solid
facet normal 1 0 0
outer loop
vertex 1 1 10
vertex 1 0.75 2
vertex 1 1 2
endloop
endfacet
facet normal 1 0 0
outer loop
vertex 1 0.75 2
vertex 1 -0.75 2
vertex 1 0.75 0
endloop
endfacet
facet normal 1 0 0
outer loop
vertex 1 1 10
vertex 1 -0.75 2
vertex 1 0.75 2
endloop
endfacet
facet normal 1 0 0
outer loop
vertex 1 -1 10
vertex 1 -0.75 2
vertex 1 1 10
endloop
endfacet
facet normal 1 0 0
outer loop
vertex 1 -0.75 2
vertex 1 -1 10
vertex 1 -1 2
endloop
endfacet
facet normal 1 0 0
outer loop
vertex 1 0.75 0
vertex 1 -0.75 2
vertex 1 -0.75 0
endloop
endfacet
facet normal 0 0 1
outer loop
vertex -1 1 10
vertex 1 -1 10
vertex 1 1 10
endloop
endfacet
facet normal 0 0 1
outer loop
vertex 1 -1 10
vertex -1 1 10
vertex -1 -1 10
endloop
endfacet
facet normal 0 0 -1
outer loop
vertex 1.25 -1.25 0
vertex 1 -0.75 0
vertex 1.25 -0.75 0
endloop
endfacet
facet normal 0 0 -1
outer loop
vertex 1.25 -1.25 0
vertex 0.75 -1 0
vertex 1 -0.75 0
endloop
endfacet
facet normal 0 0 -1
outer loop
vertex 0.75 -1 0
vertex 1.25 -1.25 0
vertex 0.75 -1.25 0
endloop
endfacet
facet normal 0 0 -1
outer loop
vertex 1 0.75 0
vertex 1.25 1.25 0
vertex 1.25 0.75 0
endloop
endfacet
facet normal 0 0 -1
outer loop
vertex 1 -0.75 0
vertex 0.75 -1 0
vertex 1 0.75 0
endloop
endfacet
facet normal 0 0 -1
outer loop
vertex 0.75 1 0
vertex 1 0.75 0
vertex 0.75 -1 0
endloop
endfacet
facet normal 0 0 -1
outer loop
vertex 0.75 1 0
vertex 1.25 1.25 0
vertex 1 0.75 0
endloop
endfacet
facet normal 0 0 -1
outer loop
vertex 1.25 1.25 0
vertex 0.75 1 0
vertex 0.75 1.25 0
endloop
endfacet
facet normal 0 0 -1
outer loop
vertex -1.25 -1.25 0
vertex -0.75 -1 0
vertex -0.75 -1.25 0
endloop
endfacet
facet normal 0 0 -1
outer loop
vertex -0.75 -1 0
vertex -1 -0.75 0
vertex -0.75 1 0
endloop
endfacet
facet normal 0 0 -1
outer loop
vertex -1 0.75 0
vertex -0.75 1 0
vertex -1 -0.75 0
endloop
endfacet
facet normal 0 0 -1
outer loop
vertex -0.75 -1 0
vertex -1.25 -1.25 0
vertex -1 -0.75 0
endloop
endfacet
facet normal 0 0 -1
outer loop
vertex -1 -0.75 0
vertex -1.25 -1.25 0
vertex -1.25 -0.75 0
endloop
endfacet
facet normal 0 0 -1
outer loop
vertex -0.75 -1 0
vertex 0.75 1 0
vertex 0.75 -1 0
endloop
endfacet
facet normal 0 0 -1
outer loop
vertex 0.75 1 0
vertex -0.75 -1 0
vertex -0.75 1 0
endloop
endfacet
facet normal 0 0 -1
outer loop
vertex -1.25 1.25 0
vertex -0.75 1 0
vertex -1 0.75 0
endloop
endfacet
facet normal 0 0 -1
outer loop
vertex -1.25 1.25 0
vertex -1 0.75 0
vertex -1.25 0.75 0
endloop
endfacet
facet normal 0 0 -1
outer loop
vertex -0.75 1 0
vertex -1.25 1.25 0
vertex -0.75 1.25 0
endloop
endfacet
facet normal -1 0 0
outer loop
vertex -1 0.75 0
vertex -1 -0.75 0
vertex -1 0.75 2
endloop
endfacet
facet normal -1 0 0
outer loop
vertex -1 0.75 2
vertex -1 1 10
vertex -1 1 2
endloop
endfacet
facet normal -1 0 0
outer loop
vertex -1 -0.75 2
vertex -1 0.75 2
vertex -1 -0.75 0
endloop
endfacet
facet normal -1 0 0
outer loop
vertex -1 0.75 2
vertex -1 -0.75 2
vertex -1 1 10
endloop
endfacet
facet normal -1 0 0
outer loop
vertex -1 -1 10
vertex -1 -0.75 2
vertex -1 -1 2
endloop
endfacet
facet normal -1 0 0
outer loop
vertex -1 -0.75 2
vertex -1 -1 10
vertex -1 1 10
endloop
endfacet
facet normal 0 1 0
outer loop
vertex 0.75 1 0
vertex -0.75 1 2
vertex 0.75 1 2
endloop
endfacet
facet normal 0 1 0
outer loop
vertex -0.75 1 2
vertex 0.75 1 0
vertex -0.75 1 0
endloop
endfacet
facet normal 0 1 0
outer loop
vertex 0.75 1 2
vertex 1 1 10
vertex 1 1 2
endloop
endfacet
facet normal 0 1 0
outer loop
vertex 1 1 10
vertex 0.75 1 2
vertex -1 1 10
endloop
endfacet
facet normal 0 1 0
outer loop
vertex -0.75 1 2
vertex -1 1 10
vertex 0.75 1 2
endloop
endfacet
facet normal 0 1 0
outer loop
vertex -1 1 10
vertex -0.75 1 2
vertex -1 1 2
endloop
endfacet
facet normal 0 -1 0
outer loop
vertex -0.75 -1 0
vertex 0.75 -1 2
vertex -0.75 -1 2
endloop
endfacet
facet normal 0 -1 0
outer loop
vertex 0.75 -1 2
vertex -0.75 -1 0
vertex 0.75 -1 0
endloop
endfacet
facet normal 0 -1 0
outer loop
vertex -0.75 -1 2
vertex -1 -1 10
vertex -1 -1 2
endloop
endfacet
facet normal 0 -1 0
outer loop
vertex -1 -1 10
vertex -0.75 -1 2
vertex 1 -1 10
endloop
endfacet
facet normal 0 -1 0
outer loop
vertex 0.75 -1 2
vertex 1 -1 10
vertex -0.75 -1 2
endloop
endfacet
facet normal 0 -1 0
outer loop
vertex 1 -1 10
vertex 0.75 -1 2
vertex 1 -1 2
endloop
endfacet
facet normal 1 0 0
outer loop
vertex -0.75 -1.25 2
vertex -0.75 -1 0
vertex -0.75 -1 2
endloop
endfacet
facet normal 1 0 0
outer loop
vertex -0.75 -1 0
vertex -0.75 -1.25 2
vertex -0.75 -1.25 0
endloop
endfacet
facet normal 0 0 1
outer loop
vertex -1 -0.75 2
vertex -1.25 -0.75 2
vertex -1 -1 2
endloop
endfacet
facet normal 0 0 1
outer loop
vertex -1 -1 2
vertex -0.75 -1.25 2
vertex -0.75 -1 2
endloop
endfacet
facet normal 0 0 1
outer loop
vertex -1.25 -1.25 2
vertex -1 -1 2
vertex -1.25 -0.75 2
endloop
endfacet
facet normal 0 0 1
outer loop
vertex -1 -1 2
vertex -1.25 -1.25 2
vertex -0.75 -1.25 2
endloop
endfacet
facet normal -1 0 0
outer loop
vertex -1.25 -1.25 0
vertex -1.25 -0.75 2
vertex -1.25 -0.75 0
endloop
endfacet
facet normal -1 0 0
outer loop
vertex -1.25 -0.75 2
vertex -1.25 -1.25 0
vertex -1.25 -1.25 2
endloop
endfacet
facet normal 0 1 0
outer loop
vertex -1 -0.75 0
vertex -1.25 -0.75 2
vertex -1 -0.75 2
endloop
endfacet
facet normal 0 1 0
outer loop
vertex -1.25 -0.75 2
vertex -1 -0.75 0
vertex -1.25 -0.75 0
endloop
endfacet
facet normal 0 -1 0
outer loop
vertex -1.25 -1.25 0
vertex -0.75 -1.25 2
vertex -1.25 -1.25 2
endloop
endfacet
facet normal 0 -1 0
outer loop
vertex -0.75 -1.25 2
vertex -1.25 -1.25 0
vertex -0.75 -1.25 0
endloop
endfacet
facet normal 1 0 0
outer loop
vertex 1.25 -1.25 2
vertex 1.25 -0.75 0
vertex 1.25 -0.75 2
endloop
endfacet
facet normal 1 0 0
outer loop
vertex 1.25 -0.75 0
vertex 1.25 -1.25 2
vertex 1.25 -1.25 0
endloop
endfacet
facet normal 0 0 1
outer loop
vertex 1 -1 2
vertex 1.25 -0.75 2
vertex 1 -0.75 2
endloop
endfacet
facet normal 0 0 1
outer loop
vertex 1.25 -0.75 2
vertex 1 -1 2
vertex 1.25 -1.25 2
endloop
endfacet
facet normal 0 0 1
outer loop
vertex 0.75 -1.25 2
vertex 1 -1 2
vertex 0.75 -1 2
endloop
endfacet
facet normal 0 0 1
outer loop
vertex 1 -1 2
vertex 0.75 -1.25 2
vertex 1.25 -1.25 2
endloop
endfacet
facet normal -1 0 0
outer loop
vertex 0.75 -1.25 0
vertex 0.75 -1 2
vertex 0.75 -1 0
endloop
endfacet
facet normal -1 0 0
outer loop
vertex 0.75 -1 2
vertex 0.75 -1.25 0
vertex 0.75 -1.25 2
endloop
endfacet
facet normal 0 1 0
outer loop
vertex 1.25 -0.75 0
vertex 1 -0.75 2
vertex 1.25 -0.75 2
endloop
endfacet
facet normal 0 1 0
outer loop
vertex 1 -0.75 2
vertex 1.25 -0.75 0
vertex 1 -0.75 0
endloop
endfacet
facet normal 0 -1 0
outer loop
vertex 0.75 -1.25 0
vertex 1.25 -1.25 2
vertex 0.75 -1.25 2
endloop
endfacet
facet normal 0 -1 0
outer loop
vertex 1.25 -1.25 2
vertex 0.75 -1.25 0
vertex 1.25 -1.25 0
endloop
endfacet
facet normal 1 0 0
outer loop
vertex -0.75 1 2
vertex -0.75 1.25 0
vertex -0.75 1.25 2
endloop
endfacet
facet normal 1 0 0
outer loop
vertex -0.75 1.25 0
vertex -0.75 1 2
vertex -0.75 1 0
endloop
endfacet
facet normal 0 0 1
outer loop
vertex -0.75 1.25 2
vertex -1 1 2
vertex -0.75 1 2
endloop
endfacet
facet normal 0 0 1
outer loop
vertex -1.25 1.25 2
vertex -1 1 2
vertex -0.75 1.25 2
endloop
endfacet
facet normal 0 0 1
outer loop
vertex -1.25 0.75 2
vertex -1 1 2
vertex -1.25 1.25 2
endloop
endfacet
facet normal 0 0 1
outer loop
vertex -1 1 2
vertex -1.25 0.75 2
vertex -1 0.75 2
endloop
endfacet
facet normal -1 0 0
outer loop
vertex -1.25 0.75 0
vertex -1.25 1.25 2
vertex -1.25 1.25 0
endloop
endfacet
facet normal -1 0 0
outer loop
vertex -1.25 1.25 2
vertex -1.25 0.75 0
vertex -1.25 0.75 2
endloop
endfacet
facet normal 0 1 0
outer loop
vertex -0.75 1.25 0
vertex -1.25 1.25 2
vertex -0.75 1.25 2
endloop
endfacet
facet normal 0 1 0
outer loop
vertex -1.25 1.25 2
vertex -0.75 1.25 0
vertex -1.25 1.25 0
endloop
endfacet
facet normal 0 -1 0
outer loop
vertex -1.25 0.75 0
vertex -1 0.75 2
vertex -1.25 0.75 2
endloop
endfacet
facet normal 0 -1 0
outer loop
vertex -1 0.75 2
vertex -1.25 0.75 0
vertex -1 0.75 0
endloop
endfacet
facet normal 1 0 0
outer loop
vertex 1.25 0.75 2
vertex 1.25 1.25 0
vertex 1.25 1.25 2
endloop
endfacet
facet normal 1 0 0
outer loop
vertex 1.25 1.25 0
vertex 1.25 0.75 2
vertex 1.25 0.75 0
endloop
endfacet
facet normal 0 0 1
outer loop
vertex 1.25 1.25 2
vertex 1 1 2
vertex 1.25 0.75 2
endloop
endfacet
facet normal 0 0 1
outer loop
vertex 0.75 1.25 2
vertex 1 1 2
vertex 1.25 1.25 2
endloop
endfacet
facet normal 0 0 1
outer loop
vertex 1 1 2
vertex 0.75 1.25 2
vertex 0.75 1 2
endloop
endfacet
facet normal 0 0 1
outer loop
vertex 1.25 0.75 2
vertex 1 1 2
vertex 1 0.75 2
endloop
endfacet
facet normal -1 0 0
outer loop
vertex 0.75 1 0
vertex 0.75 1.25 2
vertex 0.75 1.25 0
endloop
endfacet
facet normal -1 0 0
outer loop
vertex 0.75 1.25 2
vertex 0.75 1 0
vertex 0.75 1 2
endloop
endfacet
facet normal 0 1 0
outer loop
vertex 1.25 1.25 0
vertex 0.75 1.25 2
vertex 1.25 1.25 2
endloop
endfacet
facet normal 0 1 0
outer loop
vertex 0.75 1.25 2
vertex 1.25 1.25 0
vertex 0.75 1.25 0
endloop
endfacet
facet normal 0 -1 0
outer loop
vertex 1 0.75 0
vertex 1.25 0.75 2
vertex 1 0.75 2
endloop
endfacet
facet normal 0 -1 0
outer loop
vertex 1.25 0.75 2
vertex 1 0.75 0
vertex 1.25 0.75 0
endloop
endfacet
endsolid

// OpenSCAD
translate([0, 0, 5]) color([0,1,0,0.9]) cube([2, 2, 10], center=true);
translate([-1.0, -1.0, 1]) color([1,0,0]) cube([0.5, 0.5, 2], center=true);
translate([1.0, -1.0, 1]) color([1,0,0]) cube([0.5, 0.5, 2], center=true);
translate([-1.0, 1.0, 1]) color([1,0,0]) cube([0.5, 0.5, 2], center=true);
translate([1.0, 1.0, 1]) color([1,0,0]) cube([0.5, 0.5, 2], center=true);
